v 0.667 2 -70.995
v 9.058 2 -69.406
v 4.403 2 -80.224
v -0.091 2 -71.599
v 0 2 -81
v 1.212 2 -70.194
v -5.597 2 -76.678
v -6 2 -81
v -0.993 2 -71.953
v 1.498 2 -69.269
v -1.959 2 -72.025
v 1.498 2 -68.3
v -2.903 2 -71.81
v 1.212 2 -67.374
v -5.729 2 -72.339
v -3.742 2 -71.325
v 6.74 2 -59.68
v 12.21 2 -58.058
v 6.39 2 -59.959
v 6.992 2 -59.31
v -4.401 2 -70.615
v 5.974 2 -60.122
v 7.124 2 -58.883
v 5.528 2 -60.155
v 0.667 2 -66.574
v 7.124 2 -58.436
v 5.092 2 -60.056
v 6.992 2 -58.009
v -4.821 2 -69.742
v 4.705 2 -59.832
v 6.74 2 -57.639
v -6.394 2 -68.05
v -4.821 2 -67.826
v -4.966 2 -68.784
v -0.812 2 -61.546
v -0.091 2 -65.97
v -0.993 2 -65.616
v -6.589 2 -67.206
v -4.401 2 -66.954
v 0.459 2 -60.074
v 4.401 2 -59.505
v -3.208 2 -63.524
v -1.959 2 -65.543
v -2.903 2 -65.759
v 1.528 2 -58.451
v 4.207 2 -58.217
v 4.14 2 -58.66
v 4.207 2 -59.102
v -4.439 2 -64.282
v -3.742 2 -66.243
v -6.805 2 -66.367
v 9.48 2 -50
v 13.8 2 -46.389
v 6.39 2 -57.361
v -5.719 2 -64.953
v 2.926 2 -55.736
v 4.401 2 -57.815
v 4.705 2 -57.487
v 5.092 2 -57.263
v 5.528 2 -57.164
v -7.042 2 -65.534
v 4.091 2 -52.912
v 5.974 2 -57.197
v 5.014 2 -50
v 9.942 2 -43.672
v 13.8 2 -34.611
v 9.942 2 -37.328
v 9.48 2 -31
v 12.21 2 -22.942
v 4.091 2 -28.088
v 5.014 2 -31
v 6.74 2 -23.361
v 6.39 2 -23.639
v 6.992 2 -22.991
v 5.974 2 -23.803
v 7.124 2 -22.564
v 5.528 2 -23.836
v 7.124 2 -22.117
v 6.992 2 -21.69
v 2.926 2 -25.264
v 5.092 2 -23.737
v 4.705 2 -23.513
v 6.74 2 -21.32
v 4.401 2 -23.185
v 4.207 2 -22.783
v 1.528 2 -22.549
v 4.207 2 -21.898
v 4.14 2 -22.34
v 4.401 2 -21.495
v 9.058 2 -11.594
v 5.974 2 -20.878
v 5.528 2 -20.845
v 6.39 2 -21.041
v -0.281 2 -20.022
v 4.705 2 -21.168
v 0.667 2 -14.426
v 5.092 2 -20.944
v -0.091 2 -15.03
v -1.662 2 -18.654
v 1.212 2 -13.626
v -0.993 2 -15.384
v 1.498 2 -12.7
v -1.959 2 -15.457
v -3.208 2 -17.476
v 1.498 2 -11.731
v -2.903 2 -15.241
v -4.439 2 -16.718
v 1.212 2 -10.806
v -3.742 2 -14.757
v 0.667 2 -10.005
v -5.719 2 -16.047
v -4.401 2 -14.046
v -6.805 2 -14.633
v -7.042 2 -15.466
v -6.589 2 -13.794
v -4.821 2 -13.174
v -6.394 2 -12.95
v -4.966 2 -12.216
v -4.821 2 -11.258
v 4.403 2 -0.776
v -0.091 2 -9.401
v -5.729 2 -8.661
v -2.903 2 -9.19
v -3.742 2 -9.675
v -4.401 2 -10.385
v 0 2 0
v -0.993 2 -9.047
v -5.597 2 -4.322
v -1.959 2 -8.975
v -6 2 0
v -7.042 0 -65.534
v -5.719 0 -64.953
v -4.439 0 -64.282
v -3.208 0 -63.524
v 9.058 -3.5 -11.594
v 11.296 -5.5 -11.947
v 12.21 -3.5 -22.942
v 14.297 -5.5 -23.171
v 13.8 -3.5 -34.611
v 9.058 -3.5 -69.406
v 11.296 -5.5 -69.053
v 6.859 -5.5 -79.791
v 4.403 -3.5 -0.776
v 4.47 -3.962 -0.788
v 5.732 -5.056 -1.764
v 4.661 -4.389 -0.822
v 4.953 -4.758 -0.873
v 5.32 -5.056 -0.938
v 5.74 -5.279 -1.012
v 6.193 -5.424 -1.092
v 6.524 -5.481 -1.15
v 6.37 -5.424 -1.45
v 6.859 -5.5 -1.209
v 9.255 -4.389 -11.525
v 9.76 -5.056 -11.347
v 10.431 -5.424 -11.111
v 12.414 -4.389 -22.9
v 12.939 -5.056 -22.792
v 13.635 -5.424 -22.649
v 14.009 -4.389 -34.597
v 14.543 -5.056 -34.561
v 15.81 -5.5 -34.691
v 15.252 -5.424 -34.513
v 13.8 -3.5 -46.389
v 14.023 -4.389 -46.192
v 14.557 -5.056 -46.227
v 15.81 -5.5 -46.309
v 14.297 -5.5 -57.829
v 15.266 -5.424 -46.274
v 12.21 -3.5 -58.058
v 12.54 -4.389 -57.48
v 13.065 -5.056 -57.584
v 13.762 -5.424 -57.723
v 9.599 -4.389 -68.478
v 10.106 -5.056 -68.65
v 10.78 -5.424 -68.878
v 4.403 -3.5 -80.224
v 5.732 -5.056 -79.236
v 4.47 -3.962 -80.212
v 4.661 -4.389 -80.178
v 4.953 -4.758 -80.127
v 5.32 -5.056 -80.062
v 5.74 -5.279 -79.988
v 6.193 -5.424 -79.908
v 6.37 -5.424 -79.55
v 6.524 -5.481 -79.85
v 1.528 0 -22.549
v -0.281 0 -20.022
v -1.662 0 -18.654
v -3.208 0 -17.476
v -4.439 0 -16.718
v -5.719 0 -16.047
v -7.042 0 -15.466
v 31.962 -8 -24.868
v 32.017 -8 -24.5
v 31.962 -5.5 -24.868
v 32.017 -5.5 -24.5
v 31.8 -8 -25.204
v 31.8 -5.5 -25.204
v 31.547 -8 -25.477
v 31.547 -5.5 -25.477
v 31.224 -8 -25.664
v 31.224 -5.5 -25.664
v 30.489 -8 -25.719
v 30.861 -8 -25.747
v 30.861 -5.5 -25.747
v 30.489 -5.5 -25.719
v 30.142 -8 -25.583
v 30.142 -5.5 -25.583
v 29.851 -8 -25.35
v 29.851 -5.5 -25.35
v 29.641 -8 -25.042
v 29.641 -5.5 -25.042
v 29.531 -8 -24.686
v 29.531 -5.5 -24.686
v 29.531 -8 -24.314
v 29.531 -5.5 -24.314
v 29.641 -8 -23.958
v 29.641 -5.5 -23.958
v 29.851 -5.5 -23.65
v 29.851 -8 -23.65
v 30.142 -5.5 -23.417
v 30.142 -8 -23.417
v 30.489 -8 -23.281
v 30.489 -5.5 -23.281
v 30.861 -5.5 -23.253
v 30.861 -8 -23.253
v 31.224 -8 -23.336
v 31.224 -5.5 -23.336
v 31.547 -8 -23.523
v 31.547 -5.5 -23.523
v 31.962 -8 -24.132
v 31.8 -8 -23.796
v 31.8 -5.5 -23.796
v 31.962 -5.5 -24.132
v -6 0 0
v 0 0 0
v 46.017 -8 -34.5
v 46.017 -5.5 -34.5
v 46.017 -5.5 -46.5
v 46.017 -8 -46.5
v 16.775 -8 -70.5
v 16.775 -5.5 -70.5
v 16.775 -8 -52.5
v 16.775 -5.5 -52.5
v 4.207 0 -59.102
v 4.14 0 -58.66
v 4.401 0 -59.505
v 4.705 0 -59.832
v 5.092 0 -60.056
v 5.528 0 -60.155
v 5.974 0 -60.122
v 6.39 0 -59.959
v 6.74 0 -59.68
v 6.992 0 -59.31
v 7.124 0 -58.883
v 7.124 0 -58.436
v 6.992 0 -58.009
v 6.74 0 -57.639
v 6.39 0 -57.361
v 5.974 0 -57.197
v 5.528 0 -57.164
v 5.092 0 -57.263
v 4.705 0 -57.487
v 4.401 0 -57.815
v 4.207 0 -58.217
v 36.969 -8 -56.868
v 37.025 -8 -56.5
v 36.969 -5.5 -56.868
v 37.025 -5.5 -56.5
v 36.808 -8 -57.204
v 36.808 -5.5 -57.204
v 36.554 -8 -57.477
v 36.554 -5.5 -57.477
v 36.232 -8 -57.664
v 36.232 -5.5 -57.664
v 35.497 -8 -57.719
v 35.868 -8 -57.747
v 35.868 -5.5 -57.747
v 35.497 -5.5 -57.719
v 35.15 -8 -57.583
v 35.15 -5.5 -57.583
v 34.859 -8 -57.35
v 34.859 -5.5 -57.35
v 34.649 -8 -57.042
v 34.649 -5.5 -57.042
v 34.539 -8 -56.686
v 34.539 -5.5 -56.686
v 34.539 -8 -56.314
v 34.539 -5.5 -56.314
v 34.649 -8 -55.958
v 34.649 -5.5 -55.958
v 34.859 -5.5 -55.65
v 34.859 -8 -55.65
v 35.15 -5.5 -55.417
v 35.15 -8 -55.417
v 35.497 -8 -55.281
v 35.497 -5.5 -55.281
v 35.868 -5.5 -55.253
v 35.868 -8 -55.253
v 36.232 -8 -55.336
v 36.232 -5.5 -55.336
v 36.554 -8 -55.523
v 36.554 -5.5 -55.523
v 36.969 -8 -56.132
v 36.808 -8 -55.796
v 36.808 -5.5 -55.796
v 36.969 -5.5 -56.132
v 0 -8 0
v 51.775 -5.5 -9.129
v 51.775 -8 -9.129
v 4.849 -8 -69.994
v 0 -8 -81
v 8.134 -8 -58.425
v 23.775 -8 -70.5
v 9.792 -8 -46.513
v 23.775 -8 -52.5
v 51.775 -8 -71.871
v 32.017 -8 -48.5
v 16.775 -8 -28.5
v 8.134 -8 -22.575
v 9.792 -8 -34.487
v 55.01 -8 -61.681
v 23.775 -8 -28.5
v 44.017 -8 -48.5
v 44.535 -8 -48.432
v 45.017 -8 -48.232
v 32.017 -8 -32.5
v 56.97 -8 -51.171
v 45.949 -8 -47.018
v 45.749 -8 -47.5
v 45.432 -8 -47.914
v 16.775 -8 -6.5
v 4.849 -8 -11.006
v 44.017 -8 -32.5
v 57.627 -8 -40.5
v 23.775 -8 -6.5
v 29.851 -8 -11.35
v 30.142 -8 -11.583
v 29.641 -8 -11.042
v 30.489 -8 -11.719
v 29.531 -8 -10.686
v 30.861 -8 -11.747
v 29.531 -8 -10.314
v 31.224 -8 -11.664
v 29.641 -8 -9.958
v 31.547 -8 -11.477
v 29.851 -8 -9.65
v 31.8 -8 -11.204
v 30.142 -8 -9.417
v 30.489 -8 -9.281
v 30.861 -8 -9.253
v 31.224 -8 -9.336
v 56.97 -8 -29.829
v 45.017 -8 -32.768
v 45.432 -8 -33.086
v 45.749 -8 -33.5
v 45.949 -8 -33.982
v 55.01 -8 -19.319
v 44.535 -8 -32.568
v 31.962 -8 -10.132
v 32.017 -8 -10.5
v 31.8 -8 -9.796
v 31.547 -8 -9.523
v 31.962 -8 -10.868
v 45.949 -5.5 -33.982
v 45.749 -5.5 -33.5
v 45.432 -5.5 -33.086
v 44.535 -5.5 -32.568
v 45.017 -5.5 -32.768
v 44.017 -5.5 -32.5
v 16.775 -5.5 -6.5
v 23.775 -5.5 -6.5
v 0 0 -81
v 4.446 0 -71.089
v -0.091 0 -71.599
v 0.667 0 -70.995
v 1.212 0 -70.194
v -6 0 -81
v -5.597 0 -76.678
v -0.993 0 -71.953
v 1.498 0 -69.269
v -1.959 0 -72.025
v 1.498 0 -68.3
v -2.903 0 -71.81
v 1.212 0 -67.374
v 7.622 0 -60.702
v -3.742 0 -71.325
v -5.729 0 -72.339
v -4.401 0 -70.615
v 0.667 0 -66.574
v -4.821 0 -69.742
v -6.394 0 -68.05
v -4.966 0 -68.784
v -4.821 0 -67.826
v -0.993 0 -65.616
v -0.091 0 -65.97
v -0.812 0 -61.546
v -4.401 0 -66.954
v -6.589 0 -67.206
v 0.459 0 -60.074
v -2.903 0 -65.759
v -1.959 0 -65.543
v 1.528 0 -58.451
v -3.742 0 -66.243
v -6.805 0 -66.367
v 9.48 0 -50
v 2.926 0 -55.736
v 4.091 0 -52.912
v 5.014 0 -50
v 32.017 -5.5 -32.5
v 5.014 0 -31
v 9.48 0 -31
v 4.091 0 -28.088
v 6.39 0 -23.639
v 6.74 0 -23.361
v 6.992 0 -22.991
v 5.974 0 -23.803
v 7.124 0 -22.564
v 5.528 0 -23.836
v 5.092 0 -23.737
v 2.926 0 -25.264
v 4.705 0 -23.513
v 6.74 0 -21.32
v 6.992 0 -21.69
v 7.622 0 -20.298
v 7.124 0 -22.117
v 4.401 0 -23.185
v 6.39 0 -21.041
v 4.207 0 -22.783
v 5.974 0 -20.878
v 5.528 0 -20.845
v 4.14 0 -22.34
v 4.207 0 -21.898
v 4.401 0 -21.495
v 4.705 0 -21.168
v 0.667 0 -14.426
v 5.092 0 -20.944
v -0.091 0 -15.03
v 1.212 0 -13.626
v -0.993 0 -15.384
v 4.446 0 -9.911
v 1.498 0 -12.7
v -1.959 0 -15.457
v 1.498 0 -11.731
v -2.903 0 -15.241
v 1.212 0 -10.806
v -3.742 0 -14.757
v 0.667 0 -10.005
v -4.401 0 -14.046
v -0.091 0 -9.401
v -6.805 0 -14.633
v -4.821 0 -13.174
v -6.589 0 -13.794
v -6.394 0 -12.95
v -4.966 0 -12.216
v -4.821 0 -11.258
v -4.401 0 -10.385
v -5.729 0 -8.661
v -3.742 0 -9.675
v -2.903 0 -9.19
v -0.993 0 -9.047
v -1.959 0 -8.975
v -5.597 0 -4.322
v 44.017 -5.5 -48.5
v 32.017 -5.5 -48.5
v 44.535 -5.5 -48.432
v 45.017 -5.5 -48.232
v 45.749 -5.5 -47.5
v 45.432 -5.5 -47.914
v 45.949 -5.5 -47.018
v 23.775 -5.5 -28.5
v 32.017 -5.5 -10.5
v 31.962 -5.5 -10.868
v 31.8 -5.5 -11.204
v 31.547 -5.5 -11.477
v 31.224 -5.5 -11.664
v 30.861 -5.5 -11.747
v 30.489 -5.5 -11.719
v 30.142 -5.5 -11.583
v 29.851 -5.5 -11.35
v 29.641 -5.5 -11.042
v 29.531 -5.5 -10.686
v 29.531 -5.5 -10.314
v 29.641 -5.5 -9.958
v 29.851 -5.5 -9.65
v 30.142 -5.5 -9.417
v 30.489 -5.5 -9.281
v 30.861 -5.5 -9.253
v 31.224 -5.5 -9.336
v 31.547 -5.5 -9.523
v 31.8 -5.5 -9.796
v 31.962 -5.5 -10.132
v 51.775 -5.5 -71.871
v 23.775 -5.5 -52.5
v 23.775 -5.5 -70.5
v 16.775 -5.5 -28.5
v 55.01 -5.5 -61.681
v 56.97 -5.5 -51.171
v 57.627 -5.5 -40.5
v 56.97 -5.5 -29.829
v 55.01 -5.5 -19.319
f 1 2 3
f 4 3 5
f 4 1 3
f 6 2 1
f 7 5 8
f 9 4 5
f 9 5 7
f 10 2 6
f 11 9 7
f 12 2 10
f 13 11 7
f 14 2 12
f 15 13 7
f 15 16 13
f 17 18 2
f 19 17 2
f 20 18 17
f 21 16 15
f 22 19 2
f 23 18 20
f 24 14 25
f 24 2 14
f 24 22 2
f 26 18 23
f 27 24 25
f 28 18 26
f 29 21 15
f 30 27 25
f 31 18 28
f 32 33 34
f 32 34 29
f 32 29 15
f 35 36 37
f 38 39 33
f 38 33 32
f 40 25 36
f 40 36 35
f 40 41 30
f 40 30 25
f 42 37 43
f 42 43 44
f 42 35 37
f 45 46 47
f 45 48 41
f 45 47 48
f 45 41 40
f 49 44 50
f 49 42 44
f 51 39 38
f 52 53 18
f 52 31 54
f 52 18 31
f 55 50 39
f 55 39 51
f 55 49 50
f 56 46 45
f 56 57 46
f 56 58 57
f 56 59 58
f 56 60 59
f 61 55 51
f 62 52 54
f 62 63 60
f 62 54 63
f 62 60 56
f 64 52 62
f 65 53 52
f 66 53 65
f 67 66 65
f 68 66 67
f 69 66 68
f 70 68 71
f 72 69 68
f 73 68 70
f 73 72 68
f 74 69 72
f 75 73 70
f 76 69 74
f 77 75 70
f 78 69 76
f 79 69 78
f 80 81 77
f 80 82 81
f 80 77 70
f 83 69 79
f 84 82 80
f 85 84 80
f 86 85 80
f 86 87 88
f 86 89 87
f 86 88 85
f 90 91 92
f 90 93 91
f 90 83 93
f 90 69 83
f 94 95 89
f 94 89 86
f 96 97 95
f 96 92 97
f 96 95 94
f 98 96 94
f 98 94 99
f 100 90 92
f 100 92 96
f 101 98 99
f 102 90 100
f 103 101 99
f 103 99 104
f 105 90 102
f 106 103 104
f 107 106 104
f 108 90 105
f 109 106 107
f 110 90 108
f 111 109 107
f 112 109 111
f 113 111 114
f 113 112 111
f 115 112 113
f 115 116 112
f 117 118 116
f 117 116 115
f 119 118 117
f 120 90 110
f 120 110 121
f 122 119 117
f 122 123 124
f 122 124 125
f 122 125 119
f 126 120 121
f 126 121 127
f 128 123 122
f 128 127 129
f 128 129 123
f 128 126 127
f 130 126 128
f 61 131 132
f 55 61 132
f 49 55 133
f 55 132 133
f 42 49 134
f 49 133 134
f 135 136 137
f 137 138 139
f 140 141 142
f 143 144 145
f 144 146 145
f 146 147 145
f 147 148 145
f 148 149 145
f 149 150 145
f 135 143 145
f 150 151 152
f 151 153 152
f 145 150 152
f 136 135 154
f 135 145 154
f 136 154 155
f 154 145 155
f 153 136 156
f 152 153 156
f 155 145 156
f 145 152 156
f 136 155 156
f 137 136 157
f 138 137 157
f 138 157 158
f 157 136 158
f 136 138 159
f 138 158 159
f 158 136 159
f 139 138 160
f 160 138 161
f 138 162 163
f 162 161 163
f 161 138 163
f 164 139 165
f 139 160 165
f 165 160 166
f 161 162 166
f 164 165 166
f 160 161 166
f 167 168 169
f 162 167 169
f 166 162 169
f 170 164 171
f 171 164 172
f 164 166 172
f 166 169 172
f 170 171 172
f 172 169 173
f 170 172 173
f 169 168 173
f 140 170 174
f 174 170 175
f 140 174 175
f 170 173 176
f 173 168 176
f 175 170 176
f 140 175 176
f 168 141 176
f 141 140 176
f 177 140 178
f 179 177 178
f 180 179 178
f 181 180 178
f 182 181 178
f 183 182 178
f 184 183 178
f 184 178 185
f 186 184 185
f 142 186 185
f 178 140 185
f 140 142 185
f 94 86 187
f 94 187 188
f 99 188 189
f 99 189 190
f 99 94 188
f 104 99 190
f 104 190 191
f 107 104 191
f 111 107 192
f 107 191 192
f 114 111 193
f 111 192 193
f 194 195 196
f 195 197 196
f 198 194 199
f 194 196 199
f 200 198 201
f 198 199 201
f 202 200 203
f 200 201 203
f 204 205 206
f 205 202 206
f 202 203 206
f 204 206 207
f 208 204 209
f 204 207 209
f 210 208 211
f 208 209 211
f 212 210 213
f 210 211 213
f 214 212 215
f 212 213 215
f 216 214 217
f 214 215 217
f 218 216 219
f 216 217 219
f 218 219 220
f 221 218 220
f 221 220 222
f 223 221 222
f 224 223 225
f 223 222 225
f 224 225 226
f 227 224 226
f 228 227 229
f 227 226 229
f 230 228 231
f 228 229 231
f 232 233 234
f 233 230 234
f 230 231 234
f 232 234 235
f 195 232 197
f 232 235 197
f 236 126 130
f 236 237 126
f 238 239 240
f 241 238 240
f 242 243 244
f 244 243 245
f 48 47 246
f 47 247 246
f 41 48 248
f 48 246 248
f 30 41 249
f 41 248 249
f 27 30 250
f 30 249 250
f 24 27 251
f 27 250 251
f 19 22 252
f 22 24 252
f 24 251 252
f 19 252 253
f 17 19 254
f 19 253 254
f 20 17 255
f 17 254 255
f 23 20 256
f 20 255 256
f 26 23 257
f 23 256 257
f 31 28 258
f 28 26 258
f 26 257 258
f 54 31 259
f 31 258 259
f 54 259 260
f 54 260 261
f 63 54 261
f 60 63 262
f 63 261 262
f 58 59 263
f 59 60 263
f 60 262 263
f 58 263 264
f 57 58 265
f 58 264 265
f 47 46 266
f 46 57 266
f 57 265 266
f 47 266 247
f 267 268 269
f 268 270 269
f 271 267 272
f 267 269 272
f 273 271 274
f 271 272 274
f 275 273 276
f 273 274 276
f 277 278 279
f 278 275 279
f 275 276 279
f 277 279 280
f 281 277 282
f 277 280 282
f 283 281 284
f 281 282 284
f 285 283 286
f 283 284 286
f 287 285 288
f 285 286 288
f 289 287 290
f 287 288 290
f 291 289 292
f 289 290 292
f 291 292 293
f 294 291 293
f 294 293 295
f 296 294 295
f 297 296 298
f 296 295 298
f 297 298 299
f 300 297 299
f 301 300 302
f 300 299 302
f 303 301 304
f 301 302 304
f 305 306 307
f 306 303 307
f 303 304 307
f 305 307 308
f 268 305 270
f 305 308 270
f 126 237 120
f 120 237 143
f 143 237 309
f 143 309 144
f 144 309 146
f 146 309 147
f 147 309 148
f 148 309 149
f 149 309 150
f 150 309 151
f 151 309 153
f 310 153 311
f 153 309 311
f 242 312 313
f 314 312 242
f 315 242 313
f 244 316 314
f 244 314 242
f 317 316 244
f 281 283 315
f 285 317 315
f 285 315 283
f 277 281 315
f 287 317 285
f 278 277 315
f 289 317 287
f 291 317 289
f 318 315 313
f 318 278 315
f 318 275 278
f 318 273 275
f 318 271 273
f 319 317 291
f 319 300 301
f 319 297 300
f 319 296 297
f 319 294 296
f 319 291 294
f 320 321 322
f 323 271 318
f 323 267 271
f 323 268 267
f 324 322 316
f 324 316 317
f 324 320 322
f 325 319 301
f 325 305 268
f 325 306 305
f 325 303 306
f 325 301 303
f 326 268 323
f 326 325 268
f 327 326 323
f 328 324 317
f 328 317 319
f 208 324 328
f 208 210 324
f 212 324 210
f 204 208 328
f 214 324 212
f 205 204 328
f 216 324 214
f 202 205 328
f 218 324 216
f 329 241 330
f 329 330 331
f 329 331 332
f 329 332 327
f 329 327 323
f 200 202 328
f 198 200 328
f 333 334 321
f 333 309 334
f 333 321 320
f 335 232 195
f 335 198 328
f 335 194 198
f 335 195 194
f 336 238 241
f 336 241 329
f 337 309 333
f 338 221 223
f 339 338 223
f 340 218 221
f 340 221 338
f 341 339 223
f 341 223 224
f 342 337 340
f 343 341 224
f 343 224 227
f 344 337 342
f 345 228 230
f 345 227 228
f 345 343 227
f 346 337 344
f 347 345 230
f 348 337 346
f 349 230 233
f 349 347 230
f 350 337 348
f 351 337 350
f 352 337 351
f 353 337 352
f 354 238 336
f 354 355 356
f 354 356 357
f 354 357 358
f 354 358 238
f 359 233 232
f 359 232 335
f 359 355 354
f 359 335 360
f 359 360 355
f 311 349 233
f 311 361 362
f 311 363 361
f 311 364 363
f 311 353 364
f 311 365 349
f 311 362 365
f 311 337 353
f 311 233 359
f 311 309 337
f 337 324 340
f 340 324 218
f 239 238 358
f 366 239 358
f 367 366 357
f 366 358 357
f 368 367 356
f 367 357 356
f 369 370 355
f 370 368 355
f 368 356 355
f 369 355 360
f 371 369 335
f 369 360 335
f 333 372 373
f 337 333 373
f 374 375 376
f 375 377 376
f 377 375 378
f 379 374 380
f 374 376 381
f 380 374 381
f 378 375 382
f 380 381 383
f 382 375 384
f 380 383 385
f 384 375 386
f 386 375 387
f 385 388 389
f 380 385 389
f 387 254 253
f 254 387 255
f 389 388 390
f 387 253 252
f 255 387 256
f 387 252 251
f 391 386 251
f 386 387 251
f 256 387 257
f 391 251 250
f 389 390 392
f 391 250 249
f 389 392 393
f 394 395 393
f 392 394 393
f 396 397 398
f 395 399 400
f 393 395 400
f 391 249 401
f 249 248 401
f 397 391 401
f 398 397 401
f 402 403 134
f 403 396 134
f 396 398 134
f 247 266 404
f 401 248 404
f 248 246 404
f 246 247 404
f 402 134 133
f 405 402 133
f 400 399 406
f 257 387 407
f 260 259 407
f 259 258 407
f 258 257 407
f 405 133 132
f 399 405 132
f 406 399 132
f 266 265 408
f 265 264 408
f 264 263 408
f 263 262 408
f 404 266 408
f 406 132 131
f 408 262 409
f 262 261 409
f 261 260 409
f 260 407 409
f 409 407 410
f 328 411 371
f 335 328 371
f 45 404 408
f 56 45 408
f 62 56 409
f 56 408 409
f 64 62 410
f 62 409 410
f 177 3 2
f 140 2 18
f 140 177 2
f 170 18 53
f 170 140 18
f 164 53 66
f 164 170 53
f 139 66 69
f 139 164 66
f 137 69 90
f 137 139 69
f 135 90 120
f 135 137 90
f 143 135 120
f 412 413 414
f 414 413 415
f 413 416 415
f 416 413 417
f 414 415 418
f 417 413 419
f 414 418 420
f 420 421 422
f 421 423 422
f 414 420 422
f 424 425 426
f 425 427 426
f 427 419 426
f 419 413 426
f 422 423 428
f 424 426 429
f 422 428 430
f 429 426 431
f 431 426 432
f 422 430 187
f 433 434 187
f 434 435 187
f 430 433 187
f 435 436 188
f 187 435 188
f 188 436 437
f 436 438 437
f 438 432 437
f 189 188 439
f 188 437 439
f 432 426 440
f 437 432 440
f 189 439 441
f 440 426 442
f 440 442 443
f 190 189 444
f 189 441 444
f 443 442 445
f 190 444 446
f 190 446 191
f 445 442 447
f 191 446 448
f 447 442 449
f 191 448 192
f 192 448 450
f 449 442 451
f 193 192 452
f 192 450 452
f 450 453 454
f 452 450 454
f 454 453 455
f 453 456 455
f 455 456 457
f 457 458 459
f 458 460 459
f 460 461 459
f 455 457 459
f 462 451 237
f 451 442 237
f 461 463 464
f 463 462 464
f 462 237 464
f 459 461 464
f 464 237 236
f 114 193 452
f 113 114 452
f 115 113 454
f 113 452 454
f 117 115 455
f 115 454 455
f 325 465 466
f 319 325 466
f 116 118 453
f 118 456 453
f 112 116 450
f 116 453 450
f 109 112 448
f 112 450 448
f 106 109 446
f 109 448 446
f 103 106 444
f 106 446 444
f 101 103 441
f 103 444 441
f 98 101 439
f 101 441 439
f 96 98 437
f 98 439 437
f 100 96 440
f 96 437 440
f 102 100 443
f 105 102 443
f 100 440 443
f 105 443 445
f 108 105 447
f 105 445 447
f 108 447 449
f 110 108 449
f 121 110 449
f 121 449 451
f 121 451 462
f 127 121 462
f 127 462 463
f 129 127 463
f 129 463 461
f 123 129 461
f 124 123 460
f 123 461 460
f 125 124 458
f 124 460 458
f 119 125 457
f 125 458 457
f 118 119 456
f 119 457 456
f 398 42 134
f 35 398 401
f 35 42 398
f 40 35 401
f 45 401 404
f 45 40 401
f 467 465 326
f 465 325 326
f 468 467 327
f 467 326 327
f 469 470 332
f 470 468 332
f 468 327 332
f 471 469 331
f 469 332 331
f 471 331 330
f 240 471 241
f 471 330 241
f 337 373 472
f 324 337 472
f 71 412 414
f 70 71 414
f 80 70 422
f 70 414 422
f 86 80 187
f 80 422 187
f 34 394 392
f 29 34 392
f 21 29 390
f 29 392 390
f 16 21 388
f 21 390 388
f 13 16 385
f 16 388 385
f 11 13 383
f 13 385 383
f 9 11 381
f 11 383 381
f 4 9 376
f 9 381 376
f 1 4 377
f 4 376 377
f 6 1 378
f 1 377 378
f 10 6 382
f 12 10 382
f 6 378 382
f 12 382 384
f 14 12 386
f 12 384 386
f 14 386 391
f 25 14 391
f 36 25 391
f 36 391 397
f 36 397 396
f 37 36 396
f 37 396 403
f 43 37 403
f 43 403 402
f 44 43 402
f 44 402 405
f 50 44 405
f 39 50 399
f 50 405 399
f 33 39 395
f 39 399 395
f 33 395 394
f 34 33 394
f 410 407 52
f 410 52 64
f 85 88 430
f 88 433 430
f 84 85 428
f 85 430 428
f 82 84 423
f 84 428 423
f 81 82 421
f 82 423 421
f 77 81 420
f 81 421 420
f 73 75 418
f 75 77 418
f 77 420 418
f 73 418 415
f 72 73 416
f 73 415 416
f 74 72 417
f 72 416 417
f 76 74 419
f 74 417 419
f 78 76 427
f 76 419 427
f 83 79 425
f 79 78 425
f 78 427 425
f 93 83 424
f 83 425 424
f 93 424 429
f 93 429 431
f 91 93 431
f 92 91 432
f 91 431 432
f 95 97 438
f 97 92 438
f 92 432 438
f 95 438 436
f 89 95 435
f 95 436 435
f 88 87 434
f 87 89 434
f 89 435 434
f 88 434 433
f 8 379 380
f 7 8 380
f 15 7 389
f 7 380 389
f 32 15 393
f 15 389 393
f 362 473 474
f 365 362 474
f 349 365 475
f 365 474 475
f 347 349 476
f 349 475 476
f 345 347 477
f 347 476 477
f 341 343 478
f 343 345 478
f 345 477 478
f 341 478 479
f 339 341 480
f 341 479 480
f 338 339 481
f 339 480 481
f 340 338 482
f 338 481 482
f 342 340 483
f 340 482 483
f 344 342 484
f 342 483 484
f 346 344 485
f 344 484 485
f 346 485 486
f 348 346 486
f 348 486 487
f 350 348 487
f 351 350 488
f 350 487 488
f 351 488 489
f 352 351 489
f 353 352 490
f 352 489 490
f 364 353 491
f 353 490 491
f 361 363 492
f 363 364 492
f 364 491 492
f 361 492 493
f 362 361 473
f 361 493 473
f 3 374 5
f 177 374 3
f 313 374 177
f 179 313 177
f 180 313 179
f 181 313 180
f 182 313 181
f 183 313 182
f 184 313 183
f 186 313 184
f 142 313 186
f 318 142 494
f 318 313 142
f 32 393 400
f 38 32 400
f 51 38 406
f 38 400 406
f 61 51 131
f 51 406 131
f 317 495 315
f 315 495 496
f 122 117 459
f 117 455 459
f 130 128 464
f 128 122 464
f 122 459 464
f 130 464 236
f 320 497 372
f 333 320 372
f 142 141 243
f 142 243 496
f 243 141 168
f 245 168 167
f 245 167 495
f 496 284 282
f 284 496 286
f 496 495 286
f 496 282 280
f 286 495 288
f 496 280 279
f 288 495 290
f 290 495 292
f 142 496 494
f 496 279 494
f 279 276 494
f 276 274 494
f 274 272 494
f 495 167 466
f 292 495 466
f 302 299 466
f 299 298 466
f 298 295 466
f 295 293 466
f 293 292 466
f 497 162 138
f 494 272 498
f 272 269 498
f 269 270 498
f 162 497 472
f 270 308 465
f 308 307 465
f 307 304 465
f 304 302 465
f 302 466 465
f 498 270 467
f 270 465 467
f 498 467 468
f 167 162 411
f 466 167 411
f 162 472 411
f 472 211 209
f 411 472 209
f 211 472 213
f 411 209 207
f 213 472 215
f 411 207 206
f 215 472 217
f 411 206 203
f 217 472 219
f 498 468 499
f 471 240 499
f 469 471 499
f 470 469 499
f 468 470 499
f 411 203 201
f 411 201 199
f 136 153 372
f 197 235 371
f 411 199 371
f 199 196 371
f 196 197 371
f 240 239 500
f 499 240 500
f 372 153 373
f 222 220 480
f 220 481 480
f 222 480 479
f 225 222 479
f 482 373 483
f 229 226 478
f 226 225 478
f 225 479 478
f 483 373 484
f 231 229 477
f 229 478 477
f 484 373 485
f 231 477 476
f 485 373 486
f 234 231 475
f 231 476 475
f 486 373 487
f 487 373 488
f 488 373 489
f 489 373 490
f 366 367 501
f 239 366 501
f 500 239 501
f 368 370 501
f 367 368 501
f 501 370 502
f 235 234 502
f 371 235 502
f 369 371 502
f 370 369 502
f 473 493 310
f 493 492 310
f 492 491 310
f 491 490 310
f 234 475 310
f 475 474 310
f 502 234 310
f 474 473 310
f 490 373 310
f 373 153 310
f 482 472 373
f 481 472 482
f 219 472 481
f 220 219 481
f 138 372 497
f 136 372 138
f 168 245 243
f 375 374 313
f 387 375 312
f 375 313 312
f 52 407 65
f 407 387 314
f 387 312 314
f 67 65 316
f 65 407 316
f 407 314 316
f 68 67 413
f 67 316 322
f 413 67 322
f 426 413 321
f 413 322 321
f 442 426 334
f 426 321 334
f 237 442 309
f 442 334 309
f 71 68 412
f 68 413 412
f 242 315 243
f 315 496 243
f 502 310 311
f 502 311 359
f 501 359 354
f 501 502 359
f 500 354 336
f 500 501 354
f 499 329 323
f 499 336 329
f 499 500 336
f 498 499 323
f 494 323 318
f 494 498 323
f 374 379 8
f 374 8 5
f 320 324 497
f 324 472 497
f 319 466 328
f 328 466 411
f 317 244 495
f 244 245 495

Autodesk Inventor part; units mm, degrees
ref_plane "YZ Plane" through (0, 0, 0) normal (1, 0, 0) x (0, 1, 0)
ref_plane "XZ Plane" through (0, 0, 0) normal (0, 1, 0) x (-1, 0, 0)
ref_plane "XY Plane" through (0, 0, 0) normal (0, 0, 1) x (1, 0, 0)
sketch "Sketch1" plane through (0, 0, 0) normal (0, 1, 0) x (-1, 0, 0)
  line L0 (0, 0) -> (60, 0)
  line L1 (60, 0) -> (60, -81)
  line L2 (60, -81) -> (0, -81)
  line L3 (0, -81) -> (0, 0)
  line L4 (45, -21.6284) -> (15, -21.6284) construction
  line L5 (45, -81) -> (45, 0) construction
  line L6 (15, 0) -> (15, -81) construction
  circle A0 centre (40, -73.5) radius 1.5
  circle A1 centre (40, -7.5) radius 1.5
  circle A2 centre (20, -7.5) radius 1.5
  circle A3 centre (20, -73.5) radius 1.5
  line L7 (60, -40.5) -> (0, -40.5) construction
  line L8 (30, 0) -> (30, -81) construction
  circle A4 centre (30, -40.5) radius 24
  circle A5 centre (30, -40.5) radius 27.5
  circle A6 centre (57.1293, -36) radius 1.5
  circle A7 centre (57.1293, -45) radius 1.5
  circle A8 centre (25.5, -13.3707) radius 1.5
  circle A9 centre (34.5, -13.3707) radius 1.5
  circle A10 centre (2.8707, -45) radius 1.5
  circle A11 centre (2.8707, -36) radius 1.5
  circle A12 centre (34.5, -67.6293) radius 1.5
  circle A13 centre (25.5, -67.6293) radius 1.5
  circle A14 centre (30, -40.5) radius 40 construction
  arc A15 (60, -81) -> (60, 0) centre (-17.0125, -40.5) ccw
  circle A16 centre (30, -40.5) radius 36.28 construction
  circle A17 centre (65.9998, -36) radius 1.5
  circle A18 centre (65.9998, -45) radius 1.5
  circle A19 centre (-5.9998, -45) radius 1.5
  circle A20 centre (-5.9998, -36) radius 1.5
  arc A21 (0, 0) -> (0, -81) centre (77.0125, -40.5) ccw
  line L9 (30, -40.5) -> (-3.3536, -73.8536) construction
  circle A22 centre (1.7157, -68.7843) radius 1.5
  circle A23 centre (11.8404, -76.1403) radius 1.5
  circle A24 centre (23.7426, -80.0075) radius 1.5
  circle A25 centre (36.2574, -80.0075) radius 1.5
  circle A26 centre (48.1596, -76.1403) radius 1.5
  circle A27 centre (58.2843, -68.7843) radius 1.5
  circle A28 centre (65.6403, -58.6596) radius 1.5
  circle A29 centre (69.5075, -46.7574) radius 1.5
  circle A30 centre (69.5075, -34.2426) radius 1.5
  circle A31 centre (65.6403, -22.3404) radius 1.5
  circle A32 centre (58.2843, -12.2157) radius 1.5
  circle A33 centre (48.1596, -4.8597) radius 1.5
  circle A34 centre (36.2574, -0.9925) radius 1.5
  circle A35 centre (23.7426, -0.9925) radius 1.5
  circle A36 centre (11.8404, -4.8597) radius 1.5
  circle A37 centre (1.7157, -12.2157) radius 1.5
  circle A38 centre (-5.6403, -22.3404) radius 1.5
  circle A39 centre (-9.5075, -34.2426) radius 1.5
  circle A40 centre (-9.5075, -46.7574) radius 1.5
  circle A41 centre (-5.6403, -58.6596) radius 1.5
  circle A42 centre (48.1596, -68.7843) radius 1.5
  circle A43 centre (48.1596, -12.2157) radius 1.5
  circle A44 centre (11.8404, -12.2157) radius 1.5
  circle A45 centre (11.8404, -68.7843) radius 1.5
  line L10 (0, 0) -> (6, 0)
  arc A46 (6, 0) -> (6.3936, -12.9505) centre (40.8143, -5.423) ccw
  arc A47 (6.3936, -12.9505) -> (-5.0141, -31) centre (30, -40.5) ccw
  line L11 (-9.4798, -31) -> (7.9603, -31)
  line L12 (-10, -40.5) -> (70, -40.5) construction
  line L13 (-18.775, -8.5) -> (-32.775, -8.5)
  line L14 (-32.775, -8.5) -> (-32.775, -26.5)
  line L15 (-32.775, -26.5) -> (-18.775, -26.5)
  line L16 (-18.775, -26.5) -> (-18.775, -8.5)
  line L17 (-18.775, -54.5) -> (-37.775, -54.5)
  line L18 (-37.775, -54.5) -> (-37.775, -68.5)
  line L19 (-37.775, -68.5) -> (-18.775, -68.5)
  line L20 (-18.775, -68.5) -> (-18.775, -54.5)
  line L21 (-17.0125, -40.5) -> (-69.0232, -40.5)
  line L22 (-16.775, -6.5) -> (-23.775, -6.5)
  line L23 (-23.775, -6.5) -> (-23.775, -28.5)
  line L24 (-23.775, -28.5) -> (-16.775, -28.5)
  line L25 (-16.775, -28.5) -> (-16.775, -6.5)
  line L26 (-16.775, -52.5) -> (-23.775, -52.5)
  line L27 (-23.775, -52.5) -> (-23.775, -70.5)
  line L28 (-23.775, -70.5) -> (-16.775, -70.5)
  line L29 (-16.775, -70.5) -> (-16.775, -52.5)
  circle A48 centre (-30.7674, -10.5) radius 1.25
  circle A49 centre (-30.7674, -24.5) radius 1.25
  circle A50 centre (-35.775, -56.5) radius 1.25
  line L30 (-16.775, -32.5) -> (-49.775, -32.5)
  line L31 (-51.775, -34.5) -> (-51.775, -46.5)
  line L32 (-49.775, -48.5) -> (-16.775, -48.5)
  line L33 (-16.775, -48.5) -> (-16.775, -32.5)
  line L34 (-16.775, -43.5) -> (-38.775, -43.5) construction
  line L35 (-32.0174, -32.5) -> (-46.0174, -32.5)
  line L36 (-46.0174, -32.5) -> (-46.0174, -48.5)
  line L37 (-46.0174, -48.5) -> (-32.0174, -48.5)
  line L38 (-32.0174, -48.5) -> (-32.0174, -32.5)
  line L39 (0, 0) -> (-59.1614, -10.4318)
  line L40 (0, -81) -> (-59.1614, -70.5682)
  arc A51 (-51.775, -9.1293) -> (-51.775, -71.8707) centre (29.3856, -40.5) ccw
  arc A52 (-49.775, -32.5) -> (-51.775, -34.5) centre (-49.775, -34.5) ccw
  arc A53 (-51.775, -46.5) -> (-49.775, -48.5) centre (-49.775, -46.5) ccw
  arc A54 (6.3936, -68.0495) -> (6, -81) centre (40.8143, -75.577) ccw
  arc A55 (-5.0141, -50) -> (6.3936, -68.0495) centre (30, -40.5) ccw
  line L41 (-9.4798, -50) -> (7.9603, -50)
  arc A56 (-4.4033, -0.7764) -> (-4.4033, -80.2236) centre (73.0125, -40.5) ccw
  circle A57 centre (1.7157, -12.2157) radius 3.25
  circle A58 centre (1.7157, -68.7843) radius 3.25
  arc A59 (6.3936, -12.9505) -> (7.0417, -15.4657) centre (40.8143, -5.423) ccw
  arc A60 (7.0417, -15.4657) -> (0, -20.0981) centre (14.8139, -34.9486) ccw
  arc A61 (7.0417, -65.5343) -> (6.3936, -68.0495) centre (40.8143, -75.577) ccw
  arc A62 (0, -60.9019) -> (7.0417, -65.5343) centre (14.8139, -46.0514) ccw
  point P0 (30, -21.6284)
  point P1 (-18.775, -17.5)
  point P2 (-18.775, -61.5)
  point P3 (-51.775, -48.5)
  point P4 (-51.775, -32.5)
  point P5 (-16.775, -40.5)
  point P6 (-16.775, -61.5)
  point P7 (-51.775, -40.5)
  point P8 (-14, -40.5)
  point P9 (6, -81)
  point P10 (0, -60.9019)
  dimension "d18" = 48
  dimension "d6" = 60
  dimension "d7" = 81
  dimension "d8" = 3
  dimension "d9" = 7.5
  dimension "d10" = 5
  dimension "d11" = 30
  dimension "d12" = 3
  dimension "d13" = 7.5
  dimension "d14" = 5
  dimension "d15" = 3
  dimension "d16" = 3
  dimension "d17" = 5
  dimension "d19" = 55
  dimension "d20" = 3
  dimension "d21" = 4.5
  dimension "d22" = 3
  dimension "d23" = 4.5
  dimension "d24" = 360
  dimension "d25" = 80
  dimension "d26" = 72.56
  dimension "d27" = 3
  dimension "d28" = 3
  dimension "d29" = 360
  dimension "d30" = 45
  dimension "d31" = 3
  dimension "d32" = 360
  dimension "d33" = 3
  dimension "d34" = 3
  dimension "d35" = 3
  dimension "d36" = 3
  dimension "d37" = 6
  dimension "d38" = 5
  dimension "d39" = 30
  dimension "d40" = 40.5
  dimension "d41" = 14
  dimension "d42" = 18
  dimension "d43" = 19
  dimension "d44" = 14
  dimension "d45" = 7
  dimension "d46" = 2
  dimension "d47" = 2
  dimension "d48" = 2
  dimension "d49" = 2
  dimension "d50" = 2
  dimension "d51" = 2
  dimension "d52" = 7
  dimension "d53" = 2.5
  dimension "d54" = 2.5
  dimension "d55" = 2
  dimension "d56" = 2
  dimension "d57" = 2.5
  dimension "d58" = 2
  dimension "d59" = 2
  dimension "d60" = 35
  dimension "d61" = 16
  dimension "d62" = 4
  dimension "d63" = 4
  dimension "d64" = 22
  dimension "d65" = 14
  dimension "d66" = 80
  dimension "d67" = 80
  dimension "d68" = 2
  dimension "d69" = 4
  dimension "d78" = 6.5
extrude "Extrusion1" add sketch "Sketch1" along normal blind 2 contours L0 A46 A47 L3 A57 | L3 A57 A47 L11 A21 | A21 A39 A40 L40 A56 L39 | A59 A60 A47 | A21 A39 | L3 A58 A55 A54 L2 | A21 L41 A55 L3 A58 | A21 A40 | A62 A61 A55 picked at (-10.1825, -34.1938) picked at (-10.1825, -46.8062)
extrude "Extrusion2" add sketch "Sketch1" against normal blind 4 contours A21 A39 A40 L40 A56 L39 | A21 A39 | A21 A40 picked at (-10.1825, -34.1938) picked at (-10.1825, -46.8062)
ref_plane "Work Plane1" through (0, -5.5, 0) normal (0, -1, 0) x (1, 0, 0)
sketch "Sketch2" plane through (0, -5.5, 0) normal (0, -1, 0) x (1, 0, 0)
  line L0 (0, -81) -> (59.1614, -70.5682) projected
  arc A0 (51.775, -71.8707) -> (51.775, -9.1293) centre (-29.3856, -40.5) ccw projected
  line L1 (49.775, -48.5) -> (16.775, -48.5) projected
  arc A1 (49.775, -48.5) -> (51.775, -46.5) centre (49.775, -46.5) ccw projected
  line L2 (51.775, -34.5) -> (51.775, -46.5) projected
  arc A2 (51.775, -34.5) -> (49.775, -32.5) centre (49.775, -34.5) ccw projected
  line L3 (16.775, -32.5) -> (49.775, -32.5) projected
  line L4 (46.0174, -32.5) -> (46.0174, -48.5) projected
  line L5 (32.0174, -48.5) -> (32.0174, -32.5) projected
  line L6 (16.775, -48.5) -> (16.775, -32.5) projected
  arc A3 (4.4033, -80.2236) -> (4.4033, -0.7764) centre (-73.0125, -40.5) ccw projected
  arc A4 (0, -81) -> (0, 0) centre (-77.0125, -40.5) ccw projected
  line L7 (37.775, -68.5) -> (18.775, -68.5) projected
  line L8 (37.775, -54.5) -> (37.775, -68.5) projected
  line L9 (18.775, -54.5) -> (37.775, -54.5) projected
  circle A5 centre (35.775, -56.5) radius 1.25 projected
  line L10 (23.775, -52.5) -> (23.775, -70.5) projected
  line L11 (23.775, -70.5) -> (16.775, -70.5) projected
  line L12 (16.775, -70.5) -> (16.775, -52.5) projected
  line L13 (18.775, -68.5) -> (18.775, -54.5) projected
  line L14 (16.775, -52.5) -> (23.775, -52.5) projected
  line L15 (32.775, -26.5) -> (18.775, -26.5) projected
  circle A6 centre (30.7674, -24.5) radius 1.25 projected
  line L16 (32.775, -8.5) -> (32.775, -26.5) projected
  circle A7 centre (30.7674, -10.5) radius 1.25 projected
  line L17 (18.775, -8.5) -> (32.775, -8.5) projected
  line L18 (0, 0) -> (59.1614, -10.4318) projected
  line L19 (23.775, -6.5) -> (23.775, -28.5) projected
  line L20 (16.775, -6.5) -> (23.775, -6.5) projected
  line L21 (16.775, -28.5) -> (16.775, -6.5) projected
  line L22 (18.775, -26.5) -> (18.775, -8.5) projected
  line L23 (23.775, -28.5) -> (16.775, -28.5) projected
  line L24 (17.0125, -40.5) -> (69.0232, -40.5) projected
  point P0 (23.775, -26.5)
  point P1 (23.775, -8.5)
  point P2 (23.775, -68.5)
  point P3 (23.775, -54.5)
extrude "Extrusion3" add sketch "Sketch2" along normal blind 2.5 contours A4 L18 A3 L0 | L2 A1 L1 L4 L24 | L24 L4 L3 A2 L2 | A3 L18 A0 L0 | L5 L1 L6 L3 | L7 L10 L9 L8 | L15 L19 L17 L16
extrude "Extrusion4" add sketch "Sketch2" against normal up to surface (1.5 mm away) contours A4 L18 A3 L0
fillet "Fillet1" radius 2 3 edges at (46.0174, -6.75, -32.5) (46.0174, -6.75, -48.5) (14, -5.5, -40.5)
fillet "Fillet2" radius 15 2 edges at (0, 1, -20.0981) (0, 1, -60.9019)
equation "\"d11\" = 0.5 * d6"
equation "\"d12\" = d8"
equation "\"d15\" = d8"
equation "\"d16\" = d8"
equation "\"d22\" = d8"
equation "\"d27\" = d8"
equation "\"d28\" = d8"
equation "\"d31\" = d8"
equation "\"d33\" = d8"
equation "\"d34\" = d8"
equation "\"d35\" = d8"
equation "\"d36\" = d8"
properties part number "SensorHolder"
